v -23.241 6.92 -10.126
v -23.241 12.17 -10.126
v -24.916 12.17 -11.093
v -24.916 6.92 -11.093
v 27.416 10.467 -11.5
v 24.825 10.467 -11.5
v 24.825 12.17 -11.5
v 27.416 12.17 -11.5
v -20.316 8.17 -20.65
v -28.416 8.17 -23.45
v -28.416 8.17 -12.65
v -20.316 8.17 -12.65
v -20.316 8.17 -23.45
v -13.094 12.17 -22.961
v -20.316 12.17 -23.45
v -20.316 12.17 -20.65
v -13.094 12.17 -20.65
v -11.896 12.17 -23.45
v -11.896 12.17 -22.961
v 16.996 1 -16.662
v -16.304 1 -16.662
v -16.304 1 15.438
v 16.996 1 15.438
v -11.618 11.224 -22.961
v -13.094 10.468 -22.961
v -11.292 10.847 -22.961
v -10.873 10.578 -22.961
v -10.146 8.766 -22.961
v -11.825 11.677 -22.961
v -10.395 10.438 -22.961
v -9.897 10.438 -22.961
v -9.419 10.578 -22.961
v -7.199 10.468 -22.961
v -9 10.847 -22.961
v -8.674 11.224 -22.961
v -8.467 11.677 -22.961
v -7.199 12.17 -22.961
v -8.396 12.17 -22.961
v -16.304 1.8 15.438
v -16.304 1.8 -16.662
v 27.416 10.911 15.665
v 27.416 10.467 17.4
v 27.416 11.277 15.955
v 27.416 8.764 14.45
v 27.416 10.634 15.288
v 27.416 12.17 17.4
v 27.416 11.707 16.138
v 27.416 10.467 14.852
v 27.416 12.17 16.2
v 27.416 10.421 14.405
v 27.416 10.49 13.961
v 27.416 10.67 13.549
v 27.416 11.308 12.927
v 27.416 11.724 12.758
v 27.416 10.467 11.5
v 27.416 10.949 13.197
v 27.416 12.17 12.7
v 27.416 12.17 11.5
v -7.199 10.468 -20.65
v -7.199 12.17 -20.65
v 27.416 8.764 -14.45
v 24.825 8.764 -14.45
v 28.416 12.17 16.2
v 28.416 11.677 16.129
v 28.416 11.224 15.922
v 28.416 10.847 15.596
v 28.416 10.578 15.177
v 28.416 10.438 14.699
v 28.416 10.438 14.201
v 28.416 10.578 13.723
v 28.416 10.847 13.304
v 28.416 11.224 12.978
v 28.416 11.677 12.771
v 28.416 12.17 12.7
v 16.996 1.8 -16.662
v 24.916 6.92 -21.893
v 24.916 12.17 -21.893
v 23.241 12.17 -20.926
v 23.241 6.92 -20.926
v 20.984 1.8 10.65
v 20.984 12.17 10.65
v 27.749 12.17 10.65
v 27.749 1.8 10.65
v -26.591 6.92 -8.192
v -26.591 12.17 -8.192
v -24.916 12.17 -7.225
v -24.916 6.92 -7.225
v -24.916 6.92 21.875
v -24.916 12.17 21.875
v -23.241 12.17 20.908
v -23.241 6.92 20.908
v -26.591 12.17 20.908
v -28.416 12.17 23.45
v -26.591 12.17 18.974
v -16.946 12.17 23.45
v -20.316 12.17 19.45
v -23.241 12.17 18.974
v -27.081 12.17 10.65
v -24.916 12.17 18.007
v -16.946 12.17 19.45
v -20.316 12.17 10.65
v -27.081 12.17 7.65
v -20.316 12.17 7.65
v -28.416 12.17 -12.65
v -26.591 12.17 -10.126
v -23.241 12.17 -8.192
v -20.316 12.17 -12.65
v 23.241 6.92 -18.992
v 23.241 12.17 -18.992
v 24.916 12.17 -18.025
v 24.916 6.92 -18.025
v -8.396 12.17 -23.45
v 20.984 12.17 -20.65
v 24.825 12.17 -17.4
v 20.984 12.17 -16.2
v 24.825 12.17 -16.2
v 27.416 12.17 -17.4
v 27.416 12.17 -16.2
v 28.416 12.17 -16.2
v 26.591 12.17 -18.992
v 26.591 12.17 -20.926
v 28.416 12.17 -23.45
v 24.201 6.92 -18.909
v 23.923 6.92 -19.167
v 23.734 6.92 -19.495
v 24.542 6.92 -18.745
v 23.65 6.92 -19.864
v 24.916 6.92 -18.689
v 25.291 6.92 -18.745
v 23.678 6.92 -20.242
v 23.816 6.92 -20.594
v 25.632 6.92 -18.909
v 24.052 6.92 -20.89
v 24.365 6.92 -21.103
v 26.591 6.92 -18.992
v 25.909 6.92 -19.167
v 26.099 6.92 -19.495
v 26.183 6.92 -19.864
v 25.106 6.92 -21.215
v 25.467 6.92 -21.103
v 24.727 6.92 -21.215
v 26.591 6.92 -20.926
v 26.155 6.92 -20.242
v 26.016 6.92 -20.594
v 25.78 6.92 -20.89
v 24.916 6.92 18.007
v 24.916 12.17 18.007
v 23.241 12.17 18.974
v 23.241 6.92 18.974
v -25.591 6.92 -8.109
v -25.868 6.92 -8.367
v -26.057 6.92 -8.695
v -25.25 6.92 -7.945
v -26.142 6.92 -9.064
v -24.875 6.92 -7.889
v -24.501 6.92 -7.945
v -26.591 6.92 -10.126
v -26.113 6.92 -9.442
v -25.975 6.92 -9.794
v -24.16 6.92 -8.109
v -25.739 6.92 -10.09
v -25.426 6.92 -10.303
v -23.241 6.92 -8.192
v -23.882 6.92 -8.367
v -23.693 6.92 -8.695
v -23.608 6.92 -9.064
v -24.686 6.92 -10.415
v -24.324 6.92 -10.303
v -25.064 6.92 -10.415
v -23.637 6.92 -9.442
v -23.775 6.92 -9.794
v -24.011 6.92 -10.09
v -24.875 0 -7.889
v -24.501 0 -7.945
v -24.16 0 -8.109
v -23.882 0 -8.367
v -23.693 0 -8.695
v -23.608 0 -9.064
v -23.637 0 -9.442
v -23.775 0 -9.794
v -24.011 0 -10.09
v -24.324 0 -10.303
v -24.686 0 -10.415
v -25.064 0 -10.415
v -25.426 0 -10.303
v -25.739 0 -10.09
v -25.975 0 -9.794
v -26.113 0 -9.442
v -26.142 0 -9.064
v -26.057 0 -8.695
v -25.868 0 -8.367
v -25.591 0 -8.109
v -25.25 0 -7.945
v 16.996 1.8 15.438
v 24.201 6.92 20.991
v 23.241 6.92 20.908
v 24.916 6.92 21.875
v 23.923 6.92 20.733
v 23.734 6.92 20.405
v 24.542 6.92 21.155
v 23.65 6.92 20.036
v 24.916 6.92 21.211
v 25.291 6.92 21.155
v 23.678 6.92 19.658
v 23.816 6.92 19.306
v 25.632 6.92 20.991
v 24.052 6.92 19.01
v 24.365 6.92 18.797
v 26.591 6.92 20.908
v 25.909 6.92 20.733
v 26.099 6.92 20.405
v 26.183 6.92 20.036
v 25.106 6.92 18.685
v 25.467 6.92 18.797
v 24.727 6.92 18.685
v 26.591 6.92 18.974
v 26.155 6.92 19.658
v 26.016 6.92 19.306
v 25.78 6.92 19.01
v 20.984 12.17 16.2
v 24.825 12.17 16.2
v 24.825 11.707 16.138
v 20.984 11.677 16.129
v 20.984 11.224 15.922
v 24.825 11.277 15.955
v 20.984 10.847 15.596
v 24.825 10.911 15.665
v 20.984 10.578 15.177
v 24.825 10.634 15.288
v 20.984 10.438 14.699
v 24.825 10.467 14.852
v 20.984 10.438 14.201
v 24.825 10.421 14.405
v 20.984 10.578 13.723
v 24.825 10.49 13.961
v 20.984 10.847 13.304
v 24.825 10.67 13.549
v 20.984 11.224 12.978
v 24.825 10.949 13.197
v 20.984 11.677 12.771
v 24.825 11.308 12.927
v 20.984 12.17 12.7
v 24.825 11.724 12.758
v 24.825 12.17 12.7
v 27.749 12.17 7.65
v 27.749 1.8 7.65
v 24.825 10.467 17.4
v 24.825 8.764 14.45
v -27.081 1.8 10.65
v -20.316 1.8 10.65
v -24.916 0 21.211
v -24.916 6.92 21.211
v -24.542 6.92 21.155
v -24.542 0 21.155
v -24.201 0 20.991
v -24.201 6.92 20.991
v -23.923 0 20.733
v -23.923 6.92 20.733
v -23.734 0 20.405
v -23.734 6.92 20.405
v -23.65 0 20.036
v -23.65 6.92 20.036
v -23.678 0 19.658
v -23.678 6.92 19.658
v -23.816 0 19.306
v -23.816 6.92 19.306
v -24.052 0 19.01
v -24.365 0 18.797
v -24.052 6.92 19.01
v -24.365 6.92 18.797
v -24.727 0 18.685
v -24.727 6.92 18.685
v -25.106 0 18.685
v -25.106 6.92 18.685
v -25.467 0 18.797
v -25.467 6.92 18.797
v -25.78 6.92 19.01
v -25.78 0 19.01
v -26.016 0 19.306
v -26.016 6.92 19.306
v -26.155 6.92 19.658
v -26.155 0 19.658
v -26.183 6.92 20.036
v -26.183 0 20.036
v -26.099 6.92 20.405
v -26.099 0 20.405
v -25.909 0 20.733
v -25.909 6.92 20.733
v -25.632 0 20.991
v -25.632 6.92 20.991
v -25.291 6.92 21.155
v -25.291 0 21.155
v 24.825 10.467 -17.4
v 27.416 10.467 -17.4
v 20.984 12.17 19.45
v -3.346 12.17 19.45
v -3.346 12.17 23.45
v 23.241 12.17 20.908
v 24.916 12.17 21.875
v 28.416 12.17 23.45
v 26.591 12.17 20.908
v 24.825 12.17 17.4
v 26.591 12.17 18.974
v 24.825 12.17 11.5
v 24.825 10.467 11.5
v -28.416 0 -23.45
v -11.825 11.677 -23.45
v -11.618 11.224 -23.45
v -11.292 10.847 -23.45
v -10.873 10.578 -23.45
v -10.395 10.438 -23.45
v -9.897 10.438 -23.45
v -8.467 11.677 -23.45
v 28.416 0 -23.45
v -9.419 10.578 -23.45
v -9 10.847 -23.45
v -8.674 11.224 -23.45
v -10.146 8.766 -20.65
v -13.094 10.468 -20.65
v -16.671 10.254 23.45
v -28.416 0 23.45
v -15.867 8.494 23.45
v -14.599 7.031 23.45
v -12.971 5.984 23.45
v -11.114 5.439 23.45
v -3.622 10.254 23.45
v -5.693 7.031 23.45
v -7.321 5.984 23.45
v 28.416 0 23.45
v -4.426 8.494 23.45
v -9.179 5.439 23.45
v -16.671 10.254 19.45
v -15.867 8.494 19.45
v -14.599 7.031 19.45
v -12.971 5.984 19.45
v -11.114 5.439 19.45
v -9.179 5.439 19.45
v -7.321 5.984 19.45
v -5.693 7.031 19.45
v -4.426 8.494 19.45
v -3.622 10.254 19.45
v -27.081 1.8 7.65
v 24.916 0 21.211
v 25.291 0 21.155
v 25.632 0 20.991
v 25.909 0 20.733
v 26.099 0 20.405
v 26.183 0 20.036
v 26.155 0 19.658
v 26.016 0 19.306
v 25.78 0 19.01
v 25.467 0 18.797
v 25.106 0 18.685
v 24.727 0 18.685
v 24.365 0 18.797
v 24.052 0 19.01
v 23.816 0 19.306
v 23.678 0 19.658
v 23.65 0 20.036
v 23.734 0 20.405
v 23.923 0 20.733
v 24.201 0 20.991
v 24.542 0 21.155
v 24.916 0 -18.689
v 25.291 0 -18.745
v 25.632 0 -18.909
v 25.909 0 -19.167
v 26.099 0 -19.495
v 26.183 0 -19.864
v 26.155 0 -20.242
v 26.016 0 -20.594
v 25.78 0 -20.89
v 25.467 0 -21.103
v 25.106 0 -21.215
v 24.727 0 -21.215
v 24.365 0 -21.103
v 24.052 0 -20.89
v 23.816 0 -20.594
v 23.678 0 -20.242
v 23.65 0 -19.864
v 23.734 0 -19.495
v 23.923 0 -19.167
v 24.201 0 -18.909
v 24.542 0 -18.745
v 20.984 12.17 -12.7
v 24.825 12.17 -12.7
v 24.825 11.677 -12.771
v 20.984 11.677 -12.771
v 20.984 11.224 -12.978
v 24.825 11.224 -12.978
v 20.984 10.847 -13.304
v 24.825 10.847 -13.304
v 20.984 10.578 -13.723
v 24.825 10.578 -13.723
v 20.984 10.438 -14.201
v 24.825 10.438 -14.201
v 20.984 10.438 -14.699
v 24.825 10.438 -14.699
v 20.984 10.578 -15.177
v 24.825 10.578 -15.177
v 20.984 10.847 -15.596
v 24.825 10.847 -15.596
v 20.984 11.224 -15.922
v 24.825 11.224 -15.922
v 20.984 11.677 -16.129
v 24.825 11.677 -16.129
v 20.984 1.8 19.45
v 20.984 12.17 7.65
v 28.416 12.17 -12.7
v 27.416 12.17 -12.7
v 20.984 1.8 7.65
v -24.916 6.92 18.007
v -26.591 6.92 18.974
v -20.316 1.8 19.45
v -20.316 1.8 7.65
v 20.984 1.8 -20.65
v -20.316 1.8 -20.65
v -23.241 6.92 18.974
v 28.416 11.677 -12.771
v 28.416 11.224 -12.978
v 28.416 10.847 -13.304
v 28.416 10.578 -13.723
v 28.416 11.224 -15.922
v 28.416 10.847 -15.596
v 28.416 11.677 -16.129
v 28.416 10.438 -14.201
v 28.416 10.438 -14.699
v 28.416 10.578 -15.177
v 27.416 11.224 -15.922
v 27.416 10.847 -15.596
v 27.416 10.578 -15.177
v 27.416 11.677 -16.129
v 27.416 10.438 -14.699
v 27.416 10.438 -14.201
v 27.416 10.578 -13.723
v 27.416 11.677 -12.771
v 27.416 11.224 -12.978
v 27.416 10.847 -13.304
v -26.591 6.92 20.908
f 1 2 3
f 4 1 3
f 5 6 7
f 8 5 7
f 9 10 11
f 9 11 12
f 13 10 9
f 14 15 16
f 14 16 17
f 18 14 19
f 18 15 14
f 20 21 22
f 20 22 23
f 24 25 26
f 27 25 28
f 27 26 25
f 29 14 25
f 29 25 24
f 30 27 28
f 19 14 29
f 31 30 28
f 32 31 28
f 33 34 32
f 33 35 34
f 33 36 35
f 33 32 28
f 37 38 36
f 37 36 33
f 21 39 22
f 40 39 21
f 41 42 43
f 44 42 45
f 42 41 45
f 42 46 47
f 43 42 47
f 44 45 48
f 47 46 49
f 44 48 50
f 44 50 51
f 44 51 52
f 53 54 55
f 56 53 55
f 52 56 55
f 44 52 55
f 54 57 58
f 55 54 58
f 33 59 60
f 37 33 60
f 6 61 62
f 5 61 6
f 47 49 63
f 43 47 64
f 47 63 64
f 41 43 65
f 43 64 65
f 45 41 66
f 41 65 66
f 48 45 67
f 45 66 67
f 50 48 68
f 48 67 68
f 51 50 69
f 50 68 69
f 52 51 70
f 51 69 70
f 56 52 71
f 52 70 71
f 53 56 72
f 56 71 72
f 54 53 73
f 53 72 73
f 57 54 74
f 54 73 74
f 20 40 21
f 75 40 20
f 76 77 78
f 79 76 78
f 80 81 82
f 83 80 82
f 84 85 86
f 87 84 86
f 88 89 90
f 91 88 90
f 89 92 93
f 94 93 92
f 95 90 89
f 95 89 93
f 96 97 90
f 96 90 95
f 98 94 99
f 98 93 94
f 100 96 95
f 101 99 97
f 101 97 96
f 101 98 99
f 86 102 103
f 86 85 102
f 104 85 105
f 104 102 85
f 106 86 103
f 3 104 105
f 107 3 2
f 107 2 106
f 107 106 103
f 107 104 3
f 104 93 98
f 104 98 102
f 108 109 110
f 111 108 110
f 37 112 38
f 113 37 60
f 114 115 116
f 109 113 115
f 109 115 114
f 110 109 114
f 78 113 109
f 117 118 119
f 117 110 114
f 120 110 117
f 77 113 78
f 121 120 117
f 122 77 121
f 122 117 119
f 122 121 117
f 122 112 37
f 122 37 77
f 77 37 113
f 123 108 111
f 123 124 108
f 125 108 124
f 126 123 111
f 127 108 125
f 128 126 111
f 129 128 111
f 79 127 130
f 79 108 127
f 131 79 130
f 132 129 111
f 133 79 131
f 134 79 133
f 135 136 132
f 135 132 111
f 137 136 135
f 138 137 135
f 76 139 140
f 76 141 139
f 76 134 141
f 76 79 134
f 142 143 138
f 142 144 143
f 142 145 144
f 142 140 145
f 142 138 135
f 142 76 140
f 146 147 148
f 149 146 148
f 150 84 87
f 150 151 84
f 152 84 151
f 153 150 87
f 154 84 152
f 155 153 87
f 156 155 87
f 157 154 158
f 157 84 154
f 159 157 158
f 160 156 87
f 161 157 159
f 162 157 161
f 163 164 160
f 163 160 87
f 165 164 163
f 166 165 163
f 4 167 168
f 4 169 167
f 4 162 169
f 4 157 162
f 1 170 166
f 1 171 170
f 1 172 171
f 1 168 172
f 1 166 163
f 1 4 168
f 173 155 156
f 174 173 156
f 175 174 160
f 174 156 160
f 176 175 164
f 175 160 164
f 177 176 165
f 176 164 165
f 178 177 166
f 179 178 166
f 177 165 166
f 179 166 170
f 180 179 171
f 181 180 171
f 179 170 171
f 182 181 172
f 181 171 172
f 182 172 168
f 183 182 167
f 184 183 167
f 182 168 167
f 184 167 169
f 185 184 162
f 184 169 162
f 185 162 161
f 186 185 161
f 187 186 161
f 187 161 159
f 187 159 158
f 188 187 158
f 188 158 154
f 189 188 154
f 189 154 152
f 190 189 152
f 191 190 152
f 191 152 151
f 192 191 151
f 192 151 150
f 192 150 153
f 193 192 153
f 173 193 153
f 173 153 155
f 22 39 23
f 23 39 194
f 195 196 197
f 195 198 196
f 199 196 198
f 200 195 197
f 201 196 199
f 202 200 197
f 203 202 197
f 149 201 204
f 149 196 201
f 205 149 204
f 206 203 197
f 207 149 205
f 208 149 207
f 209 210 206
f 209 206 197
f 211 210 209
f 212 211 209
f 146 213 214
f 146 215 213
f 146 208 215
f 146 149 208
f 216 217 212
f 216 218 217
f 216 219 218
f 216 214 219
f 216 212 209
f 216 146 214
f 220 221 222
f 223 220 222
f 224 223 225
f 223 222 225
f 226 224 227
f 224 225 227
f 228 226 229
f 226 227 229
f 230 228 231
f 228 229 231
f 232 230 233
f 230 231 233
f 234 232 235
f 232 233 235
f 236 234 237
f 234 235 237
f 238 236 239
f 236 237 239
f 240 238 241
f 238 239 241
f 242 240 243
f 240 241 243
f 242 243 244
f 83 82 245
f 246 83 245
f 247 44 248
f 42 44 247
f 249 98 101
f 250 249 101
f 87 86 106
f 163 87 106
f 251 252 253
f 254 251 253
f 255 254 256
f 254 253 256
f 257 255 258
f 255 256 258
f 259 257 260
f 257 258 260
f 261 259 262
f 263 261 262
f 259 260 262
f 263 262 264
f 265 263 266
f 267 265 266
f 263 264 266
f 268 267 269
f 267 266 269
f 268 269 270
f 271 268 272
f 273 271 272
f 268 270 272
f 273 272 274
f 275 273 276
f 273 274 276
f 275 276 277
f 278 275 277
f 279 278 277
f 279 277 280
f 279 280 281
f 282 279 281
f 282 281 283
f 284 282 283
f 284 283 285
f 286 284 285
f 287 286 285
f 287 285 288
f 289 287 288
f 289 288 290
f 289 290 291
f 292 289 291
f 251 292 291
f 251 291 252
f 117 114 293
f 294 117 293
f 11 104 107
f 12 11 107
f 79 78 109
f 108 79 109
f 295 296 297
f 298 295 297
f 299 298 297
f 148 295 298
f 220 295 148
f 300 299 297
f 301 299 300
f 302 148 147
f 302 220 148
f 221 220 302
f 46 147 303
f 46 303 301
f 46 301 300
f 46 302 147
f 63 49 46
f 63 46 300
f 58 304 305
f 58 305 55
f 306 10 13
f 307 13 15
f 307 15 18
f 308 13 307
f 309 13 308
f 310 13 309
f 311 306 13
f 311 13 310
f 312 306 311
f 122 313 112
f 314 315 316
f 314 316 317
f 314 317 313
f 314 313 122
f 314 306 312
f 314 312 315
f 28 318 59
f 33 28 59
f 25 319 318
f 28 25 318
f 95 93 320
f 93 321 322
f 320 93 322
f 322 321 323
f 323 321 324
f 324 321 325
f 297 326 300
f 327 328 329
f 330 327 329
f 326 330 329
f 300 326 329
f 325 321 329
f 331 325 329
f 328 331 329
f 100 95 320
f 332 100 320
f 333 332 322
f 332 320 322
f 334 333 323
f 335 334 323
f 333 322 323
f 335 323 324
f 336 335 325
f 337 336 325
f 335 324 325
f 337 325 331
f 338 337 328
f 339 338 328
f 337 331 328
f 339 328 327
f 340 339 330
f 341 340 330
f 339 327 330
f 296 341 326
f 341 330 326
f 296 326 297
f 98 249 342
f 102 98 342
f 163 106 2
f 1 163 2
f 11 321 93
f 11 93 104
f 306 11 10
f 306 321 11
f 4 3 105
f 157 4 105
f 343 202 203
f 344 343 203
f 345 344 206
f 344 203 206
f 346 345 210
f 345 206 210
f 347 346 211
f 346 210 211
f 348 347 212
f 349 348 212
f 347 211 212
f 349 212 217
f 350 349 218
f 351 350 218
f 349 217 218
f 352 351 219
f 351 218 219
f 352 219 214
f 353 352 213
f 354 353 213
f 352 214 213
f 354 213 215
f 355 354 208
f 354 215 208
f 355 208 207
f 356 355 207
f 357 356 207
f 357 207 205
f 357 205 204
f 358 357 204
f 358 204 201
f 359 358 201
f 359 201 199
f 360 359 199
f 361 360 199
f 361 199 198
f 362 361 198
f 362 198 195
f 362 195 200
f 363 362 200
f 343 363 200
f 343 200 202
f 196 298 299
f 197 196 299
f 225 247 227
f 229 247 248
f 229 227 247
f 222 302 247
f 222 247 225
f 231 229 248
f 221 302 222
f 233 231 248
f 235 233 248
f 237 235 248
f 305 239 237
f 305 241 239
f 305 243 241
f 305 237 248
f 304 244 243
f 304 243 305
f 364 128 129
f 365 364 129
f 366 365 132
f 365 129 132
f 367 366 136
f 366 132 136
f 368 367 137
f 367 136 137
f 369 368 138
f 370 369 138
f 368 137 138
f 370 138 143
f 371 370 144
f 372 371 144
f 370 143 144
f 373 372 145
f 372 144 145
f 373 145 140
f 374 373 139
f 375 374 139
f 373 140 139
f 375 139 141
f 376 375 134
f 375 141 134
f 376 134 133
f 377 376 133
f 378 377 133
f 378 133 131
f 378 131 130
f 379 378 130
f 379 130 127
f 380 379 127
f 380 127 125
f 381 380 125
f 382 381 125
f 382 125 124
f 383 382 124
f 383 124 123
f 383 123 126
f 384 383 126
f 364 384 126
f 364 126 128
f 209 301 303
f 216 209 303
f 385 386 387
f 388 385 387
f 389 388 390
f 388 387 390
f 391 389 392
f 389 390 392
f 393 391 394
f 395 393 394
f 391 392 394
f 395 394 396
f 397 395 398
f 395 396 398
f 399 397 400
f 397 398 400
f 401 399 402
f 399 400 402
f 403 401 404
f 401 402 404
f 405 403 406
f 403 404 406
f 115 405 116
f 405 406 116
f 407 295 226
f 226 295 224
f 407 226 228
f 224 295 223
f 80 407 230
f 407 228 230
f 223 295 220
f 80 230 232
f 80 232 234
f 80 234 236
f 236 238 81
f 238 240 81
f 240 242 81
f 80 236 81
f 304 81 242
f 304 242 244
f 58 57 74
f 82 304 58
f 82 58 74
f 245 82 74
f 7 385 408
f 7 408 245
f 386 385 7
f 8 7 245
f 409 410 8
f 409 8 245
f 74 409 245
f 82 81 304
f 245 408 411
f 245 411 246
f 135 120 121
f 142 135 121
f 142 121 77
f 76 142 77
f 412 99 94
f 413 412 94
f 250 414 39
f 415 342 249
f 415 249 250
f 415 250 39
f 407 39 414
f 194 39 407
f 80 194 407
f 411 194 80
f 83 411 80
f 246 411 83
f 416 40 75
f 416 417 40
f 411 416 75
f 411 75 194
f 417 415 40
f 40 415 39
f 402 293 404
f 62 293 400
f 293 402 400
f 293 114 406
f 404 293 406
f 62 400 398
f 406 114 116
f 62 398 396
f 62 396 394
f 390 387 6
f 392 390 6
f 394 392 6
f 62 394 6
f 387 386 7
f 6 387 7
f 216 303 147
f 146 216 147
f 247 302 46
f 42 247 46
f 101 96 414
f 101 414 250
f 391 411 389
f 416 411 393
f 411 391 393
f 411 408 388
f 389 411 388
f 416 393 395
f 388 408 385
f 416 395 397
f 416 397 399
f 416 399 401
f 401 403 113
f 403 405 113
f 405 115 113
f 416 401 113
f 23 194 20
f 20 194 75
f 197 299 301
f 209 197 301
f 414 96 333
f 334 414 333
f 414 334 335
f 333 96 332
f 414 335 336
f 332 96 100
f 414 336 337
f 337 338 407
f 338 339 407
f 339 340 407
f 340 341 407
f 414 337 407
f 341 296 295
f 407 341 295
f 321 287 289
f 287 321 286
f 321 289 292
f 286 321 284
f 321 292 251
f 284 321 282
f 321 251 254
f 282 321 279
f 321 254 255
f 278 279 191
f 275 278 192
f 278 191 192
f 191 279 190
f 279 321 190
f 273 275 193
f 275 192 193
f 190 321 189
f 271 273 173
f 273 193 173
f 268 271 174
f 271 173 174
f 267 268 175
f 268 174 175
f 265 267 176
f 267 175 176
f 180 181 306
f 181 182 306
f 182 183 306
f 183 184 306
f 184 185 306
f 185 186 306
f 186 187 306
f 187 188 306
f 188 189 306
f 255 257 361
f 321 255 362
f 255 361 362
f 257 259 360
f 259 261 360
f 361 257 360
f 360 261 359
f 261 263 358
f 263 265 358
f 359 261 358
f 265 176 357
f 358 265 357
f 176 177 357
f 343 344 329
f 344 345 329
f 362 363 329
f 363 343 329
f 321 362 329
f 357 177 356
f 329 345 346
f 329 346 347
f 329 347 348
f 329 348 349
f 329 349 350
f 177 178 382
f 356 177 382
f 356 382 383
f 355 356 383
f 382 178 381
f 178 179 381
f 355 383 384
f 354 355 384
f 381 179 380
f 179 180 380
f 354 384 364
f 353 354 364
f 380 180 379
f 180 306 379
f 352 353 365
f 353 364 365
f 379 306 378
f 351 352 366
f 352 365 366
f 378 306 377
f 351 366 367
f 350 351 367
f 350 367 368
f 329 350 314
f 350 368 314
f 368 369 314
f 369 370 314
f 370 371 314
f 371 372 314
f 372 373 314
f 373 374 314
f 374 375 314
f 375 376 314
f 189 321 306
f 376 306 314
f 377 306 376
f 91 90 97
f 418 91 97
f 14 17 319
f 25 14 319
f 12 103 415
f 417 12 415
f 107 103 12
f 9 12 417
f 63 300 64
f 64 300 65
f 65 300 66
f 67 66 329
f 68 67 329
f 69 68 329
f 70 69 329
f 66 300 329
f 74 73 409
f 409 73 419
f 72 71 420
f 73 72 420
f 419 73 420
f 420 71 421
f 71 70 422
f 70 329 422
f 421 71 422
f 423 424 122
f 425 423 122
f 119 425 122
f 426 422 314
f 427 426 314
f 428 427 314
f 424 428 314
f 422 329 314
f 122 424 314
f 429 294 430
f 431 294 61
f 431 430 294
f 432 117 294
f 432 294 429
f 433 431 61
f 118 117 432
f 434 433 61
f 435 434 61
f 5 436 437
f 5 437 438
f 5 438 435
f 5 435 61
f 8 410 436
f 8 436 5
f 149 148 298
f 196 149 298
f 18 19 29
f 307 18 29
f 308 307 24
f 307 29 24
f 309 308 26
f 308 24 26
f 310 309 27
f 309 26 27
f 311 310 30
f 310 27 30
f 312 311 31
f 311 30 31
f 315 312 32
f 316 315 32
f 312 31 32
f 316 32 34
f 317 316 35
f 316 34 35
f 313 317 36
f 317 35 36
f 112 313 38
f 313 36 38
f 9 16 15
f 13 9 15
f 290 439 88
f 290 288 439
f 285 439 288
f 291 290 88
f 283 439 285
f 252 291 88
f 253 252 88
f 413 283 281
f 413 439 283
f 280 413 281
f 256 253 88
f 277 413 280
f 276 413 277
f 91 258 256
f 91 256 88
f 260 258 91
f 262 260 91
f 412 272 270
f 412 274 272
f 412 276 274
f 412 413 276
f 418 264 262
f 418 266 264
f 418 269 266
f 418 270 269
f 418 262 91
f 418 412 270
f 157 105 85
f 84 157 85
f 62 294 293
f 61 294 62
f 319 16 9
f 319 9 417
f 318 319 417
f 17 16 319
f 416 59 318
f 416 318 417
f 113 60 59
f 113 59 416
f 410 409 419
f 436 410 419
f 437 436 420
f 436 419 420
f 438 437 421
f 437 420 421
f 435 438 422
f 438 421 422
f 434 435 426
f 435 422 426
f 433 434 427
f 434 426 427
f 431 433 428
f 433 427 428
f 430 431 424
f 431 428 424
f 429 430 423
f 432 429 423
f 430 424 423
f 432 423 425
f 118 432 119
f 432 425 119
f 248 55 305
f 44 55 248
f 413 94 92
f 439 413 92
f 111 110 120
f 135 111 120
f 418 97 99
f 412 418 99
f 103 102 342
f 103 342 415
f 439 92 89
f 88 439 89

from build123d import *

# Parameters (mm, degrees)
SKETCH1_W              = 56.8325
SKETCH1_H              = 46.9000078
BOSS_EXTRUDE1_DEPTH    = 12.1700036
SKETCH2_W              = 41.2999936
SKETCH2_H              = 40.099996
CUT_EXTRUDE1_DEPTH     = 10.3700072
SKETCH3_W              = 33.3000096
SKETCH3_H              = 32.100012
CUT_EXTRUDE2_DEPTH     = 0.7999984
SKETCH4_W              = 8.1000092
SKETCH4_H              = 10.8000038
CUT_EXTRUDE3_DEPTH     = 3.999992
CUT_EXTRUDE4_START     = -10.3700072
CUT_EXTRUDE4_OUTLINE_W = 6.7650106
CUT_EXTRUDE4_OUTLINE_H = 2.999994
CUT_EXTRUDE4_DEPTH     = 10.3700072
SKETCH6_W              = 6.7650106
SKETCH6_H              = 2.999994
CUT_EXTRUDE5_DEPTH     = 10.3700072
CUT_EXTRUDE6_DEPTH     = 3.999992
CUT_EXTRUDE7_DEPTH     = 5.2500022
SKETCH9_R              = 1.270176684
SKETCH9_R_2            = 1.270176657
CUT_EXTRUDE8_DEPTH     = 38.486962618
CUT_EXTRUDE10_DEPTH    = 2.3114
CUT_EXTRUDE11_DEPTH    = 0.4886198
CUT_EXTRUDE12_DEPTH    = 7.4324972
SKETCH14_W             = 2.5908
SKETCH14_H             = 5.8999882
CUT_EXTRUDE13_DEPTH    = 1.7031716
CUT_EXTRUDE15_DEPTH    = 2.5908


# Read off the part's stored shape, not the designer's step: Cut-Extrude4
with BuildPart() as part:
    # Sketch1 → Boss-Extrude1 (new body)
    with BuildSketch(Plane(origin=(0, 0, 0), x_dir=(1, 0, 0), z_dir=(0, 1, 0))):
        Rectangle(SKETCH1_W, SKETCH1_H)
    extrude(amount=BOSS_EXTRUDE1_DEPTH)

    # Sketch2 → Cut-Extrude1 (cut)
    with BuildSketch(Plane(origin=(0, 12.1700036, 0), x_dir=(1, 0, 0), z_dir=(0, 1, 0))):
        with Locations((0.333756, 0.5999861)):
            Rectangle(SKETCH2_W, SKETCH2_H)
    extrude(amount=-CUT_EXTRUDE1_DEPTH, mode=Mode.SUBTRACT)

    # Sketch3 → Cut-Extrude2 (cut)
    with BuildSketch(Plane(origin=(0, 1.7999964, 0), x_dir=(1, 0, 0), z_dir=(0, 1, 0))):
        with Locations((0.345948, 0.6121781)):
            Rectangle(SKETCH3_W, SKETCH3_H)
    extrude(amount=-CUT_EXTRUDE2_DEPTH, mode=Mode.SUBTRACT)

    # Sketch4 → Cut-Extrude3 (cut)
    with BuildSketch(Plane(origin=(0, 12.1700036, 0), x_dir=(1, 0, 0), z_dir=(0, 1, 0))):
        with Locations((-24.3662454, 18.050002)):
            Rectangle(SKETCH4_W, SKETCH4_H)
    extrude(amount=-CUT_EXTRUDE3_DEPTH, mode=Mode.SUBTRACT)

    # Cut-Extrude4 outline → Cut-Extrude4 (cut)
    with BuildSketch(Plane(origin=(0, 12.1700036, 0), x_dir=(1, 0, 0), z_dir=(0, 1, 0)).offset(CUT_EXTRUDE4_START)):
        with Locations((-23.6987461, -9.1500071)):
            Rectangle(CUT_EXTRUDE4_OUTLINE_W, CUT_EXTRUDE4_OUTLINE_H)
    extrude(amount=CUT_EXTRUDE4_DEPTH, mode=Mode.SUBTRACT)

    # Sketch6 → Cut-Extrude5 (cut)
    with BuildSketch(Plane(origin=(0, 12.1700036, 0), x_dir=(1, 0, 0), z_dir=(0, 1, 0))):
        with Locations((24.3662581, -9.1500071)):
            Rectangle(SKETCH6_W, SKETCH6_H)
    extrude(amount=-CUT_EXTRUDE5_DEPTH, mode=Mode.SUBTRACT)

    # Sketch7 → Cut-Extrude6 (cut)
    with BuildSketch(Plane.XY.offset(23.4500039)):
        with BuildLine():
            Line((-3.3462468, 12.1700036), (-16.946245, 12.1700036))
            ThreePointArc((-16.946245, 12.1700036), (-10.1462459, 5.3699918), (-3.3462468, 12.1700036))
        make_face()
    extrude(amount=-CUT_EXTRUDE6_DEPTH, mode=Mode.SUBTRACT)

    # Sketch8 → Cut-Extrude7 (cut)
    with BuildSketch(Plane(origin=(0, 12.1700036, 0), x_dir=(1, 0, 0), z_dir=(0, 1, 0))):
        Polygon((-24.916257, -18.0069617), (-26.591255007, -18.97402225), (-26.591255007, -20.90814335), (-24.916257, -21.8752039), (-23.241258993, -20.90814335), (-23.241258993, -18.97402225), align=None)
        Polygon((-24.916257, 11.0930309), (-26.591255007, 10.12597035), (-26.591255007, 8.19184925), (-24.916257, 7.2247887), (-23.241258993, 8.19184925), (-23.241258993, 10.12597035), align=None)
        Polygon((24.9162316, 21.8930347), (23.241233593, 20.92597415), (23.241233593, 18.99185305), (24.9162316, 18.0247925), (26.591229607, 18.99185305), (26.591229607, 20.92597415), align=None)
        Polygon((24.9162316, -18.0069617), (23.241233593, -18.97402225), (23.241233593, -20.90814335), (24.9162316, -21.8752039), (26.591229607, -20.90814335), (26.591229607, -18.97402225), align=None)
    extrude(amount=-CUT_EXTRUDE7_DEPTH, mode=Mode.SUBTRACT)

    # Sketch9 → Cut-Extrude8 (cut, through all)
    with BuildSketch(Plane(origin=(0, 6.9200014, 0), x_dir=(1, 0, 0), z_dir=(0, 1, 0))):
        with Locations(Location((-24.875109, 9.1588971, 0), (0, 0, 270))):
            Circle(SKETCH9_R)
        with Locations(Location((-24.916257, -19.9410828, 0), (0, 0, 270))):
            Circle(SKETCH9_R_2)
        with Locations(Location((24.9162316, -19.9410828, 0), (0, 0, 270))):
            Circle(SKETCH9_R_2)
        with Locations(Location((24.9162316, 19.9589136, 0), (0, 0, 270))):
            Circle(SKETCH9_R_2)
    extrude(amount=-CUT_EXTRUDE8_DEPTH, mode=Mode.SUBTRACT)

    # Sketch11 → Cut-Extrude10 (cut)
    with BuildSketch(Plane.XY.offset(-20.6499841)):
        Polygon((-13.093837264, 10.4681909), (-10.1462332, 8.7663909), (-7.198629136, 10.4681909), (-7.198629136, 13.8717909), (-10.1462332, 15.5735909), (-13.093837264, 13.8717909), align=None)
    extrude(amount=-CUT_EXTRUDE10_DEPTH, mode=Mode.SUBTRACT)

    # Sketch12 → Cut-Extrude11 (cut)
    with BuildSketch(Plane.XY.offset(-22.9613841)):
        with BuildLine():
            ThreePointArc((-8.3962367, 12.1700036), (-10.1462332, 13.9200001), (-11.8962297, 12.1700036))
            Line((-11.8962297, 12.1700036), (-8.3962367, 12.1700036))
        make_face()
        with BuildLine():
            Line((-8.3962367, 12.1700036), (-11.8962297, 12.1700036))
            ThreePointArc((-11.8962297, 12.1700036), (-10.1462332, 10.4200071), (-8.3962367, 12.1700036))
        make_face()
    extrude(amount=-CUT_EXTRUDE11_DEPTH, mode=Mode.SUBTRACT)

    # Sketch13 → Cut-Extrude12 (cut)
    with BuildSketch(Plane(origin=(28.41625, 0, 0), x_dir=(0, 0, -1), z_dir=(1, 0, 0))):
        with BuildLine():
            ThreePointArc((16.1999803, 12.1700036), (14.4499838, 13.9200001), (12.6999873, 12.1700036))
            Line((12.6999873, 12.1700036), (16.1999803, 12.1700036))
        make_face()
        with BuildLine():
            Line((16.1999803, 12.1700036), (12.6999873, 12.1700036))
            ThreePointArc((12.6999873, 12.1700036), (14.4499838, 10.4200071), (16.1999803, 12.1700036))
        make_face()
        with BuildLine():
            Line((-16.2000057, 12.1700036), (-12.7000127, 12.1700036))
            ThreePointArc((-12.7000127, 12.1700036), (-14.4500092, 13.9200001), (-16.2000057, 12.1700036))
        make_face()
        with BuildLine():
            ThreePointArc((-16.2000057, 12.1700036), (-14.4500092, 10.4200071), (-12.7000127, 12.1700036))
            Line((-12.7000127, 12.1700036), (-16.2000057, 12.1700036))
        make_face()
    extrude(amount=-CUT_EXTRUDE12_DEPTH, mode=Mode.SUBTRACT)

    # Sketch14 → Cut-Extrude13 (cut)
    with BuildSketch(Plane(origin=(0, 12.1700036, 0), x_dir=(1, 0, 0), z_dir=(0, 1, 0))):
        with Locations((26.120852, -14.4500092)):
            Rectangle(SKETCH14_W, SKETCH14_H)
    extrude(amount=-CUT_EXTRUDE13_DEPTH, mode=Mode.SUBTRACT)

    # Sketch16 → Cut-Extrude15 (cut)
    with BuildSketch(Plane.ZY.offset(-27.416252)):
        with BuildLine():
            Line((14.4500092, 8.763635), (17.4000033, 10.466832))
            Line((17.4000033, 10.466832), (14.852121437, 10.466832))
            ThreePointArc((14.852121437, 10.466832), (15.822266967, 11.084003429), (16.2000057, 12.1700036))
            Line((16.2000057, 12.1700036), (11.5000151, 12.1700036))
            Line((11.5000151, 12.1700036), (11.5000151, 10.466832))
            Line((11.5000151, 10.466832), (14.4500092, 8.763635))
        make_face()
        Polygon((-17.3999779, 12.1700036), (-17.3999779, 10.466832), (-14.4499838, 8.763635), (-11.4999897, 10.466832), (-11.4999897, 12.1700036), align=None)
    extrude(amount=CUT_EXTRUDE15_DEPTH, mode=Mode.SUBTRACT)


solid = part.part
